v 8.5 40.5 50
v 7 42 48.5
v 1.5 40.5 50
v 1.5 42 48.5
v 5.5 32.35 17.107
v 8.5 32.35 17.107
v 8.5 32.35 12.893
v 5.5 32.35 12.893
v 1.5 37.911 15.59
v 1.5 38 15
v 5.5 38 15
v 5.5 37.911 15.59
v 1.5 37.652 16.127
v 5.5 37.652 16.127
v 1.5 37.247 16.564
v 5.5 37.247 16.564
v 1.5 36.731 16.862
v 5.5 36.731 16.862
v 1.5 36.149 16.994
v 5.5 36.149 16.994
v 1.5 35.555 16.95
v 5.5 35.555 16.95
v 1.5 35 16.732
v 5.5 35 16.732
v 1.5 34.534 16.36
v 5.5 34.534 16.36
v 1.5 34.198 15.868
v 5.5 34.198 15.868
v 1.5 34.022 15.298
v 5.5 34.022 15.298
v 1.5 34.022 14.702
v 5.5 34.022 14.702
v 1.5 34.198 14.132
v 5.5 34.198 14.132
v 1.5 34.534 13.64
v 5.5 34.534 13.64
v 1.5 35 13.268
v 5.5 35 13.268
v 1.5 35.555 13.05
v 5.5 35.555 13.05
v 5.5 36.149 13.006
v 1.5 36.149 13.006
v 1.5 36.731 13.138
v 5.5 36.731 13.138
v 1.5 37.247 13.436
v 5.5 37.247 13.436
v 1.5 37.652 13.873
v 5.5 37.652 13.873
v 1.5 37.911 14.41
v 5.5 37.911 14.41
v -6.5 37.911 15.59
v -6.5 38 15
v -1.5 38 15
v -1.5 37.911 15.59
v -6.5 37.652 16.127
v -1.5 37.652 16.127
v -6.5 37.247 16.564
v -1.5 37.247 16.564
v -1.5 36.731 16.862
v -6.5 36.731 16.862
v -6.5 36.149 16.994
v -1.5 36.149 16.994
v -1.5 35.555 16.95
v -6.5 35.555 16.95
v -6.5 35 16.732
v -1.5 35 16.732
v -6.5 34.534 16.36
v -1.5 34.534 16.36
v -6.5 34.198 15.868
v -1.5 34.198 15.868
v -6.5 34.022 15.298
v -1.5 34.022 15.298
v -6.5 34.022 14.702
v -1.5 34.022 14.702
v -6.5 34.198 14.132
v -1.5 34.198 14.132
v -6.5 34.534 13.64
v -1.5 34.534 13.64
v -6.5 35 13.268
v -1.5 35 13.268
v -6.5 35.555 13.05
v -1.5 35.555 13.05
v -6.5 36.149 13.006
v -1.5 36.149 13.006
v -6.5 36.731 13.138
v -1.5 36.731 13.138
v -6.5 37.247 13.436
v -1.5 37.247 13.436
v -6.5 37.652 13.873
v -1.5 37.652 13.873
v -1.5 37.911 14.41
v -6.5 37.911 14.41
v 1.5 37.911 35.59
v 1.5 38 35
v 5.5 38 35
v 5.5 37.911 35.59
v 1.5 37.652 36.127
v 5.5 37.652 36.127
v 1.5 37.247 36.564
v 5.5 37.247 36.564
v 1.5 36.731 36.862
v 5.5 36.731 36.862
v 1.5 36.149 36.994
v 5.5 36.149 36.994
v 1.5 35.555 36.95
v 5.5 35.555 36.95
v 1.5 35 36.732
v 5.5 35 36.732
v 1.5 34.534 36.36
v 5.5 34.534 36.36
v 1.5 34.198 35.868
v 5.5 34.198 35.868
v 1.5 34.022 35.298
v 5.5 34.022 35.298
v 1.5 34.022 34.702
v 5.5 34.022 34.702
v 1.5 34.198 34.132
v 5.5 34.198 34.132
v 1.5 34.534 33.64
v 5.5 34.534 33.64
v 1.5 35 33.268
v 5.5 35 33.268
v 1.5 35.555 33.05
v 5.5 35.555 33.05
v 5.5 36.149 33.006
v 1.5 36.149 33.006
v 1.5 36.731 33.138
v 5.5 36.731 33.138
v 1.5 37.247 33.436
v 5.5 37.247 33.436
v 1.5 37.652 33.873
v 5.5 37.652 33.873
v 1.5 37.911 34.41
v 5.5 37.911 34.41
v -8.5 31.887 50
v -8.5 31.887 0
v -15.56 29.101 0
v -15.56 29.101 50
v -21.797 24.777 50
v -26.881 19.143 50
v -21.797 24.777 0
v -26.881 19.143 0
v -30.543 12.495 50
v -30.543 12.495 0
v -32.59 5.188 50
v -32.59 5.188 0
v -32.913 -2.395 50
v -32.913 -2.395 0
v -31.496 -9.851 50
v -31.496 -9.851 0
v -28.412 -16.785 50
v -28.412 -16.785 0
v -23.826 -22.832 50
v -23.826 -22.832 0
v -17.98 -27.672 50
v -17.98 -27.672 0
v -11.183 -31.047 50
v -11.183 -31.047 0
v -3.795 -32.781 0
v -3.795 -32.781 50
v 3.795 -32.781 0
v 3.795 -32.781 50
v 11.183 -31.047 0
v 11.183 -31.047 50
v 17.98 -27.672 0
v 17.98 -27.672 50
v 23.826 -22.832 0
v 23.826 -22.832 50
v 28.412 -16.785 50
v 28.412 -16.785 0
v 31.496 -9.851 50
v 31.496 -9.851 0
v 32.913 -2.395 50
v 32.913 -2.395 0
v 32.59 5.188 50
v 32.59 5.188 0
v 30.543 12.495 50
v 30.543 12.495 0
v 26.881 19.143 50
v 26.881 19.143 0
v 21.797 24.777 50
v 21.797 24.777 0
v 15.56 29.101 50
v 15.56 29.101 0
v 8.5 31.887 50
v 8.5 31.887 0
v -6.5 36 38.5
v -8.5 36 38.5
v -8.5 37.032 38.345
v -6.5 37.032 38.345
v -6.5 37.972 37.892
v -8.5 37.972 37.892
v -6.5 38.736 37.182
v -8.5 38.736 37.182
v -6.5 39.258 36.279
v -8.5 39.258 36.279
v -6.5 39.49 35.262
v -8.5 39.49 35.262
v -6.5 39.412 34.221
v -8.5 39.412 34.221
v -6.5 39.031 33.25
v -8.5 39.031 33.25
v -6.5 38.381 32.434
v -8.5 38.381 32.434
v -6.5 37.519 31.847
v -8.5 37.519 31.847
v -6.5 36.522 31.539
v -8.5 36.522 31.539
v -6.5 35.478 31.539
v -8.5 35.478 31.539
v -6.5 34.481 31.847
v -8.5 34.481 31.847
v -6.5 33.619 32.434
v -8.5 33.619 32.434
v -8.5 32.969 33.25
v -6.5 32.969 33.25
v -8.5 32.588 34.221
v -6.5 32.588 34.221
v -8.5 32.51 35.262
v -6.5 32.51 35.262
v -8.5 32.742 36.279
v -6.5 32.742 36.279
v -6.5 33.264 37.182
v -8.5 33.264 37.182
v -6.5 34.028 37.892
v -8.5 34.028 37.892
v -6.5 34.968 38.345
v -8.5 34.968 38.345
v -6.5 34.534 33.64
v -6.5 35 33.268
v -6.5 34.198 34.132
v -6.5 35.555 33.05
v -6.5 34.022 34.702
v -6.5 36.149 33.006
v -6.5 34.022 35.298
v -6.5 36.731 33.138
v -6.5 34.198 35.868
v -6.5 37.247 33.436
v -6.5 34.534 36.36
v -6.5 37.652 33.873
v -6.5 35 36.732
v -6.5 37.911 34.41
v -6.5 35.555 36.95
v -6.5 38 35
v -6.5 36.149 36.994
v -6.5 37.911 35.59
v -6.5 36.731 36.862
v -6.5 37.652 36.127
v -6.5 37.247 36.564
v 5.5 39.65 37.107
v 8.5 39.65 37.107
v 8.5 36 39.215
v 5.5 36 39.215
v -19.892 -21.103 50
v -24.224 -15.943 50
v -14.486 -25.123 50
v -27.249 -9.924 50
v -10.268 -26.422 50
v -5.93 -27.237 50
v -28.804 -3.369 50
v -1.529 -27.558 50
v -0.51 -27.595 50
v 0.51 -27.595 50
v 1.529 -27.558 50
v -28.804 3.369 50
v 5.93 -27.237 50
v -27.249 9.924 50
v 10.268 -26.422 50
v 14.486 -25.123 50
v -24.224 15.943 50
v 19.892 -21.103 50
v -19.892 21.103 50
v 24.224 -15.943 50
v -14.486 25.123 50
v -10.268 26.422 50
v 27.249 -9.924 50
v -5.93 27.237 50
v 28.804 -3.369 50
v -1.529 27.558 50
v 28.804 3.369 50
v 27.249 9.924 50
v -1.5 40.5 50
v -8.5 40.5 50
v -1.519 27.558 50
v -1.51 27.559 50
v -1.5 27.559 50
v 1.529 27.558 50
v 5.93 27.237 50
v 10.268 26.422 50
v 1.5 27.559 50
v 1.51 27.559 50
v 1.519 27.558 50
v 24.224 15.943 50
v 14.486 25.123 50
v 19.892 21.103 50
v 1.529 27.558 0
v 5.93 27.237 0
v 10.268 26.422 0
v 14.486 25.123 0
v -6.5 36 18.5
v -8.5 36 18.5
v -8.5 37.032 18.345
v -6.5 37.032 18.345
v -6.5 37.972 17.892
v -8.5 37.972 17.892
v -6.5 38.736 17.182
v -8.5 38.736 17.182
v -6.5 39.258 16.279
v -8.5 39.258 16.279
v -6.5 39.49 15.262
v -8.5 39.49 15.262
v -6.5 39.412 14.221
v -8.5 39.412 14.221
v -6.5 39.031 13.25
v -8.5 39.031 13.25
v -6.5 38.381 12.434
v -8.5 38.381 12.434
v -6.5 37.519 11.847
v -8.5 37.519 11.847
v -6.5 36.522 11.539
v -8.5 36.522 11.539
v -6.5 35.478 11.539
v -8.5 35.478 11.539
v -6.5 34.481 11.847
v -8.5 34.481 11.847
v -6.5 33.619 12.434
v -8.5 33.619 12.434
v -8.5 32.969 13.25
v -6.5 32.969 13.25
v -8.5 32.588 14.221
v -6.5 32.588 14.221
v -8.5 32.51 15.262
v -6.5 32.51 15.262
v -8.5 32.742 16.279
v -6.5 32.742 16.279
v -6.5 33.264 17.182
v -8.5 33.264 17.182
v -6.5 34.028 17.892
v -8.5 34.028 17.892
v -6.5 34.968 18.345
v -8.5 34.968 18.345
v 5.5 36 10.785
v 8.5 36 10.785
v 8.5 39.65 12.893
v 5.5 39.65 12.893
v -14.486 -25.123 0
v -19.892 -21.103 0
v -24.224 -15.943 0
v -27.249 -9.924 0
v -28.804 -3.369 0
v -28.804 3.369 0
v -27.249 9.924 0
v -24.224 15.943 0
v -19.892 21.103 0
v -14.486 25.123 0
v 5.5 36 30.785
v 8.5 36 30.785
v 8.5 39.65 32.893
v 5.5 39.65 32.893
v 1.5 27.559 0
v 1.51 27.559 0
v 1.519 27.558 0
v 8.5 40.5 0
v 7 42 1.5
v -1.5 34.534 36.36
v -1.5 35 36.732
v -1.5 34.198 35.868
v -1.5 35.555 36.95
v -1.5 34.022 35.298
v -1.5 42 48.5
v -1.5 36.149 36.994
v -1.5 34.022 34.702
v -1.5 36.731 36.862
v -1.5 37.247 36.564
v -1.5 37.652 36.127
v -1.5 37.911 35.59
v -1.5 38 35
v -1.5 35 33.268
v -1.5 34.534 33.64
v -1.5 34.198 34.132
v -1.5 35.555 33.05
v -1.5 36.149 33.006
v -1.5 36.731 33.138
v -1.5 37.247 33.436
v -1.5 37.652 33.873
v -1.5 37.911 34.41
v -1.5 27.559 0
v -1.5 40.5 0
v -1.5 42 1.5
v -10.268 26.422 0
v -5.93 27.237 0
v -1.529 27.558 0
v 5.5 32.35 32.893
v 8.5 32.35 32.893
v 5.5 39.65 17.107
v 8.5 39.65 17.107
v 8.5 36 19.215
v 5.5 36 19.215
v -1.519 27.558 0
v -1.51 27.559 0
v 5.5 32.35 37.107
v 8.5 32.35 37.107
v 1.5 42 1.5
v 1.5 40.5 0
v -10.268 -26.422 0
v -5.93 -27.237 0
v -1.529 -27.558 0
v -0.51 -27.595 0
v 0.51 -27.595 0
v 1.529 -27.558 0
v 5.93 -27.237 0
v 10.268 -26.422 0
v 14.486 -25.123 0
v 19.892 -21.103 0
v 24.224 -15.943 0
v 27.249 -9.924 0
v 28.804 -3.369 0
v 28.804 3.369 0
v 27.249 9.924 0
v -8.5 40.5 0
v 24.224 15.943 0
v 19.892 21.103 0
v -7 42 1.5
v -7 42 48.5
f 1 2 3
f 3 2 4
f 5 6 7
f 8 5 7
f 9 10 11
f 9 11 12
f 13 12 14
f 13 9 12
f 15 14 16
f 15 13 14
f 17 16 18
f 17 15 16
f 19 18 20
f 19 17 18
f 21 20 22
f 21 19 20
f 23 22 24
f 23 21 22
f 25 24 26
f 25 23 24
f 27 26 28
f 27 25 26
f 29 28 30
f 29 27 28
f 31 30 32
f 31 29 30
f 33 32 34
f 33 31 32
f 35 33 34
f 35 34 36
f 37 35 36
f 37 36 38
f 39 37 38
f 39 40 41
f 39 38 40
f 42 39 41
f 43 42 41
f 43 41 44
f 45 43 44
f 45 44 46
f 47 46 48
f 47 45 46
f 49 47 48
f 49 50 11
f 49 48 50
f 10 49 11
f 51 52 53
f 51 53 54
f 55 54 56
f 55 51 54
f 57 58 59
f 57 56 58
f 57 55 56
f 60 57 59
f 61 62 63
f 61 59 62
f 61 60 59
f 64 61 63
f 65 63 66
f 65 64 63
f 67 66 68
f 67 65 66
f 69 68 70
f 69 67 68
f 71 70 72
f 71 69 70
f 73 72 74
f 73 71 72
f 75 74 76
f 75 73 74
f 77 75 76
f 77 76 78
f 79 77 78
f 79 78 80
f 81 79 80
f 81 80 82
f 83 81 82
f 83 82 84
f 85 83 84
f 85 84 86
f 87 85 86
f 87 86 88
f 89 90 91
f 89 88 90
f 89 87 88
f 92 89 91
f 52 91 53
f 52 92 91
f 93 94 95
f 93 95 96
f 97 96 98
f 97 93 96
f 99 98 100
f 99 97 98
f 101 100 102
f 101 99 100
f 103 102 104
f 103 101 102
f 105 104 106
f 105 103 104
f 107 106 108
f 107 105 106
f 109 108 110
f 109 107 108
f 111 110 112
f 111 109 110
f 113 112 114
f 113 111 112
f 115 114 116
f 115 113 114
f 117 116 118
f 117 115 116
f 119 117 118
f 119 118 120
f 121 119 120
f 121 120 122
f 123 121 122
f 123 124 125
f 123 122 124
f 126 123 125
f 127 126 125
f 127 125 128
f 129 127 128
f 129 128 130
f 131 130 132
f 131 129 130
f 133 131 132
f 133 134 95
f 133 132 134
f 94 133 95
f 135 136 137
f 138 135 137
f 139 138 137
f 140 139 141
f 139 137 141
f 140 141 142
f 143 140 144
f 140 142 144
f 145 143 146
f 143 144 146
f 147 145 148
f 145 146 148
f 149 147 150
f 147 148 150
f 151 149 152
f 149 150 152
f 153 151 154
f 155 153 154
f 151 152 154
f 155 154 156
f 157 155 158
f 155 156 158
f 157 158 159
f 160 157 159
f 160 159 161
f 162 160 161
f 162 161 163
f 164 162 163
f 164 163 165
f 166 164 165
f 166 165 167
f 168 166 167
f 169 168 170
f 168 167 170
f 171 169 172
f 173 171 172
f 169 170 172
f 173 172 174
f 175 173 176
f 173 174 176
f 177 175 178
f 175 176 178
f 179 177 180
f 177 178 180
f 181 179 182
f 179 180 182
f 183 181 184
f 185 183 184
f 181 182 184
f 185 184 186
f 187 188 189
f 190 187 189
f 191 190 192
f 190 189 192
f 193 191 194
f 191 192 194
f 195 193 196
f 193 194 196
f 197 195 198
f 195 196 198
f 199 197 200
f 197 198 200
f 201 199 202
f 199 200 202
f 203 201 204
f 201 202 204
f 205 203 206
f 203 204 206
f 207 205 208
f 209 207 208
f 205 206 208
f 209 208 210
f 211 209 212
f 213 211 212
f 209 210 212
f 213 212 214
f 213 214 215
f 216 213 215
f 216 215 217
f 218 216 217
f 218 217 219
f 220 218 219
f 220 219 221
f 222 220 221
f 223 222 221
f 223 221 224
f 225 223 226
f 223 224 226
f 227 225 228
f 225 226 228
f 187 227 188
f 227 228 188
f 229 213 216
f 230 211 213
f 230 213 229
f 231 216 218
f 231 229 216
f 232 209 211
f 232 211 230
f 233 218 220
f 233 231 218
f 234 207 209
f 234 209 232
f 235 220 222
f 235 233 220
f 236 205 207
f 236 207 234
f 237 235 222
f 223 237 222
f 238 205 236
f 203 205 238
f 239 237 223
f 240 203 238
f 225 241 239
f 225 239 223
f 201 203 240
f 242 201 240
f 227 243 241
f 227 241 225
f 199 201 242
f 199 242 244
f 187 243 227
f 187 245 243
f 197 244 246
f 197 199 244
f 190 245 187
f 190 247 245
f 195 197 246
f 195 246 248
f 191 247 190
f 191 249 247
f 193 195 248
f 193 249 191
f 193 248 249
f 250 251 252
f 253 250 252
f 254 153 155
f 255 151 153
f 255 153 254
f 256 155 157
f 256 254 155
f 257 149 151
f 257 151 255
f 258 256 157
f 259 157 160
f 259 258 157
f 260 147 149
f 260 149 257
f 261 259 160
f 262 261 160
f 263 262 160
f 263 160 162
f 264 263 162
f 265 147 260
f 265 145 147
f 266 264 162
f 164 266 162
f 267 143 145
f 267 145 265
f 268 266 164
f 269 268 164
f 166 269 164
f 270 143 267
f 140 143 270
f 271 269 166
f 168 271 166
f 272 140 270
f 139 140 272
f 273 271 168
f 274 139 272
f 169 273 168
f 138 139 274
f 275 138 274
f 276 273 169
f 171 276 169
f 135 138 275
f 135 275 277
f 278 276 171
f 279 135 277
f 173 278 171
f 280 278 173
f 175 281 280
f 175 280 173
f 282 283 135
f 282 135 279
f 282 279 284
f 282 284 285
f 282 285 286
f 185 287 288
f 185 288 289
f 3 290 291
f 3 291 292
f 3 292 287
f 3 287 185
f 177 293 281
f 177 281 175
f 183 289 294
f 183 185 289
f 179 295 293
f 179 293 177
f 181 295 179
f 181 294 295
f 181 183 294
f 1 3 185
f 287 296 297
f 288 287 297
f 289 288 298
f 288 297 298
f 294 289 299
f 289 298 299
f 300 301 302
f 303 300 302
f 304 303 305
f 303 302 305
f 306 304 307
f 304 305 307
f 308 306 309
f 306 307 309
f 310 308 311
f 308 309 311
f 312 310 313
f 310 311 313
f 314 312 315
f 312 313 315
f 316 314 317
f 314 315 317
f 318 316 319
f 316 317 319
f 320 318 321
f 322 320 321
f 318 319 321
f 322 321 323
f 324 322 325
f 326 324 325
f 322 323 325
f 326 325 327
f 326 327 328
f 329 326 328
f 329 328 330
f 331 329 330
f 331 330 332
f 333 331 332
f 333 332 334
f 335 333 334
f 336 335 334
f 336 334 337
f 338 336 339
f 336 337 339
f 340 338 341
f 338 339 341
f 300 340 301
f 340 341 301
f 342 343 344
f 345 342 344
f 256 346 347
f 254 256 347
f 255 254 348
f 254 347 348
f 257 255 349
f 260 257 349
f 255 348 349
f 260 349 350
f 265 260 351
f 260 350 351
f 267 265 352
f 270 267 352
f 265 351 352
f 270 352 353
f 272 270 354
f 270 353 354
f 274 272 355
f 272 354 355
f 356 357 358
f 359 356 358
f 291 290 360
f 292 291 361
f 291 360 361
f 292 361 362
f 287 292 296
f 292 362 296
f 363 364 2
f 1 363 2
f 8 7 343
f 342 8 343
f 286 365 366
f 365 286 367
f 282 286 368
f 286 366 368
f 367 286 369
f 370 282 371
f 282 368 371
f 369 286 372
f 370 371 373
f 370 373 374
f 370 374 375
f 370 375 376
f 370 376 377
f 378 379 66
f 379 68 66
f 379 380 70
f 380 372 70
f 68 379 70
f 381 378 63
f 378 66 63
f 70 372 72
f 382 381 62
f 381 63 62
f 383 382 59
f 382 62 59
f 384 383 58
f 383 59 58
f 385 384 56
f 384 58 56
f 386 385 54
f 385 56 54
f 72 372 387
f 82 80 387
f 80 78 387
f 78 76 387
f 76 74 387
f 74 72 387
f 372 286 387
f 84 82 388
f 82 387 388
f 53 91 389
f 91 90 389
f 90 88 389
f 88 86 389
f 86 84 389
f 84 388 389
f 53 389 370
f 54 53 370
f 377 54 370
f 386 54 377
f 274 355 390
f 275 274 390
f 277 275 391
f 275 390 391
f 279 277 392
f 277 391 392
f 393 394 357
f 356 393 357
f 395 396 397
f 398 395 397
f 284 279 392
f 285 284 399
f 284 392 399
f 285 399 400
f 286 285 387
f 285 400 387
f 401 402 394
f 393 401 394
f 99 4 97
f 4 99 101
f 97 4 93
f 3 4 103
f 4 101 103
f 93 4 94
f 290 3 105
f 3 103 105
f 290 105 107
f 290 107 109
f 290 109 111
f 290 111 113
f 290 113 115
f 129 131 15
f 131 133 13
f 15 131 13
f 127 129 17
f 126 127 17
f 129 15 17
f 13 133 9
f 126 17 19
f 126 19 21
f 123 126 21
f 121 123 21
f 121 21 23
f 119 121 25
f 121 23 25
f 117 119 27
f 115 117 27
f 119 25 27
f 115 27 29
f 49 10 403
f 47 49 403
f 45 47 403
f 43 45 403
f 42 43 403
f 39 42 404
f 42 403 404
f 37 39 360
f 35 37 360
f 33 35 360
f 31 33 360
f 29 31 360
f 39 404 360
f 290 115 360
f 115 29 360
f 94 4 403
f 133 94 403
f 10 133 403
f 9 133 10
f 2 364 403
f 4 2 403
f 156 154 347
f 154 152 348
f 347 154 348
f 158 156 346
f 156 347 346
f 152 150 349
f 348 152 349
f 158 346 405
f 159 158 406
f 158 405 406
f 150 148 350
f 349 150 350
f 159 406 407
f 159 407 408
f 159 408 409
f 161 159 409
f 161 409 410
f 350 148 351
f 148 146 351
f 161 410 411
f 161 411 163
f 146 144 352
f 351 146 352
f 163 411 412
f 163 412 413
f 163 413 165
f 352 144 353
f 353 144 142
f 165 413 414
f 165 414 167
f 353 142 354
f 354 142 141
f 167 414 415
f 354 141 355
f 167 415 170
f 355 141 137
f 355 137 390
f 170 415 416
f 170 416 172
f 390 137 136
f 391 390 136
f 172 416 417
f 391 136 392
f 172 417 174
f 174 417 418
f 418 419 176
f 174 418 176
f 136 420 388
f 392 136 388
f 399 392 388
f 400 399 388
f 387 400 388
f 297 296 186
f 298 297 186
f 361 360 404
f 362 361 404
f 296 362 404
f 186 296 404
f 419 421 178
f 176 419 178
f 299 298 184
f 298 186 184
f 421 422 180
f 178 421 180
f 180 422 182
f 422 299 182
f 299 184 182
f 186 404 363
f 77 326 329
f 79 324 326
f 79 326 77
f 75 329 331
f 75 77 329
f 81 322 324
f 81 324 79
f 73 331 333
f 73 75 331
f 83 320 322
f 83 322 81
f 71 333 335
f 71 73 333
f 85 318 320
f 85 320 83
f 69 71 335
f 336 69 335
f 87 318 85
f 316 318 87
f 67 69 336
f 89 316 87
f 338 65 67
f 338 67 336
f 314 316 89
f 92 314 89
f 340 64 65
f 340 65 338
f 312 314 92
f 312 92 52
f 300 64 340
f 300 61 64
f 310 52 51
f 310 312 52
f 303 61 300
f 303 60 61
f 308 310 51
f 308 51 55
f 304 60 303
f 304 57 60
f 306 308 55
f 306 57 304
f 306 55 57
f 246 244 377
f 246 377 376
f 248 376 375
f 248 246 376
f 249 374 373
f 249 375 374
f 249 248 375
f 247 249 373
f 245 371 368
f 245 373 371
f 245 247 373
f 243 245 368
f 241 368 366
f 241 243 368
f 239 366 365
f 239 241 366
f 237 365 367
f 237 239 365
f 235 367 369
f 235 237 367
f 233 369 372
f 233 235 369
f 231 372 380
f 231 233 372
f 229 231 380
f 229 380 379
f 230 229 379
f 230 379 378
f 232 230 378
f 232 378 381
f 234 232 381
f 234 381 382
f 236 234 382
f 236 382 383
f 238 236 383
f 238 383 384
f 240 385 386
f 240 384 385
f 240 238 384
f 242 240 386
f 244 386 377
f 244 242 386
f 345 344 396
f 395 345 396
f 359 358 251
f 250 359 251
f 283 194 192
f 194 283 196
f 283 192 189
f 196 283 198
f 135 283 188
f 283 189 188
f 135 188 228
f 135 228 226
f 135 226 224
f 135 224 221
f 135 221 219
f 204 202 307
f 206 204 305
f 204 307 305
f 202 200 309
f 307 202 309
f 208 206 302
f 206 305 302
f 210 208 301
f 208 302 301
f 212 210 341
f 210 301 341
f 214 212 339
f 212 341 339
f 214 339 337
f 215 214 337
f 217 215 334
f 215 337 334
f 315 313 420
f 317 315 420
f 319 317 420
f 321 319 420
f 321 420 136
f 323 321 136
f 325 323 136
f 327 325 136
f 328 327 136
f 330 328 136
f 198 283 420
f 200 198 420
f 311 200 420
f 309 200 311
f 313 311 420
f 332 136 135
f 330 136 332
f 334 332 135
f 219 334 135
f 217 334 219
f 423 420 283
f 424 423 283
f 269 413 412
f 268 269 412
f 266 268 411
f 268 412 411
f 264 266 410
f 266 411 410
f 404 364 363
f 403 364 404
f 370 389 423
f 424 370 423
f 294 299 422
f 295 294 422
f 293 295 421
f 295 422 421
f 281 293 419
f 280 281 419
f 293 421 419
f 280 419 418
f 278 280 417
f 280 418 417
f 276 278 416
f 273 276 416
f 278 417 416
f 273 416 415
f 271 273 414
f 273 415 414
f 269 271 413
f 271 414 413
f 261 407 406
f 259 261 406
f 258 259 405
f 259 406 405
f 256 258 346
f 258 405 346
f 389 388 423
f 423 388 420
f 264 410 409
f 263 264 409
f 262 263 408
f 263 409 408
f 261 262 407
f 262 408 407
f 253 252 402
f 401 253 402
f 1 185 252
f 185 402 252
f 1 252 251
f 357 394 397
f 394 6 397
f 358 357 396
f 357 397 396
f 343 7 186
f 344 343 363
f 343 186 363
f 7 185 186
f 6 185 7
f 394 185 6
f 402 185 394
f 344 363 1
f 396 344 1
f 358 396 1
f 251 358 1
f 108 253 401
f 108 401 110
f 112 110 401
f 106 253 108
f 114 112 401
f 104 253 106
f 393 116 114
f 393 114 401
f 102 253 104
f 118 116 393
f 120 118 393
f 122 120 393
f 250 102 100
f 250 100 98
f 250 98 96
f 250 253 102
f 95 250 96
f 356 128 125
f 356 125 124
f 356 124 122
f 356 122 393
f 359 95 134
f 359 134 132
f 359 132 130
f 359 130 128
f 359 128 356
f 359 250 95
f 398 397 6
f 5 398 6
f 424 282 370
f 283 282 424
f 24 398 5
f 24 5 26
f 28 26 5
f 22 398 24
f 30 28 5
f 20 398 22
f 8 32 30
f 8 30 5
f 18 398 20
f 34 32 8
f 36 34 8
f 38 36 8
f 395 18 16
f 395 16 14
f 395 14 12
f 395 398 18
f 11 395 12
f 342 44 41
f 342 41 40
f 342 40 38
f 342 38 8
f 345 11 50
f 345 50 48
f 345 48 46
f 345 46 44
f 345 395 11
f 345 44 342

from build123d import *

# Parameters (mm, degrees)
EXTRUDE_1_DEPTH          = 50
CUT_EXTRUDE_1_DEPTH      = 74.164198895
CUT_EXTRUDE_1_DEPTH_BACK = 74.164198895
SKETCH_2_R               = 2
SKETCH_3_R               = 3.5
CUT_EXTRUDE_2_DEPTH      = 2
CHAMFER_1_SIZE           = 1.5
CUT_EXTRUDE_3_DEPTH      = 3


with BuildPart() as part:
    # 스케치1 → 보스-돌출1 (new body)
    with BuildSketch(Plane.XY):
        with BuildLine():
            Line((-1.5, 32.465366161), (-1.5, 42))
            Line((-1.5, 42), (-8.5, 42))
            Line((-8.5, 42), (-8.5, 31.886517527))
            ThreePointArc((-8.5, 31.886517527), (0, -33), (8.5, 31.886517527))
            Line((8.5, 31.886517527), (8.5, 42))
            Line((8.5, 42), (1.5, 42))
            Line((1.5, 42), (1.5, 32.465366161))
            Line((1.5, 32.465366161), (1.5, 27.559208987))
            ThreePointArc((1.5, 27.559208987), (1.514407087, 27.558421057), (1.528813761, 27.557625596))
            ThreePointArc((1.528813761, 27.557625596), (8.110662779, 26.890433295), (14.48576204, 25.122951621))
            ThreePointArc((14.48576204, 25.122951621), (29, 0), (14.48576204, -25.122951621))
            ThreePointArc((14.48576204, -25.122951621), (8.110662779, -26.890433295), (1.528813761, -27.557625596))
            ThreePointArc((1.528813761, -27.557625596), (0, -27.6), (-1.528813761, -27.557625596))
            ThreePointArc((-1.528813761, -27.557625596), (-8.110662779, -26.890433295), (-14.48576204, -25.122951621))
            ThreePointArc((-14.48576204, -25.122951621), (-29, 0), (-14.48576204, 25.122951621))
            ThreePointArc((-14.48576204, 25.122951621), (-8.110662779, 26.890433295), (-1.528813761, 27.557625596))
            ThreePointArc((-1.528813761, 27.557625596), (-1.514407087, 27.558421057), (-1.5, 27.559208987))
            Line((-1.5, 27.559208987), (-1.5, 32.465366161))
        make_face()
    extrude(amount=EXTRUDE_1_DEPTH)

    # 스케치2 → 컷-돌출1 (cut, two sides: drawn at the far end of the back side and taken through both)
    with BuildSketch(Plane(origin=(0, 0, 0), x_dir=(0, 0, -1), z_dir=(1, 0, 0)).offset(-CUT_EXTRUDE_1_DEPTH_BACK)):
        with Locations(Location((-35, 36, 0), (0, 0, 90))):
            Circle(SKETCH_2_R)
        with Locations(Location((-15, 36, 0), (0, 0, 90))):
            Circle(SKETCH_2_R)
    extrude(amount=CUT_EXTRUDE_1_DEPTH + CUT_EXTRUDE_1_DEPTH_BACK, mode=Mode.SUBTRACT)

    # 스케치3 → 컷-돌출2 (cut)
    with BuildSketch(Plane.ZY.offset(8.5)):
        with Locations((15, 36)):
            Circle(SKETCH_3_R)
        with Locations((35, 36)):
            Circle(SKETCH_3_R)
    extrude(amount=-CUT_EXTRUDE_2_DEPTH, mode=Mode.SUBTRACT)

    # 모따기1
    chamfer_1_edges = [part.edges().sort_by_distance(p)[0] for p in [
        (-5, 42, 50),
        (5, 42, 0),
        (-5, 42, 0),
        (5, 42, 50),
        (8.5, 42, 25),
        (-8.5, 42, 25),
    ]]
    chamfer(chamfer_1_edges, length=CHAMFER_1_SIZE)

    # 스케치4 → 컷-돌출3 (cut)
    with BuildSketch(Plane(origin=(8.5, 0, 0), x_dir=(0, 0, -1), z_dir=(1, 0, 0))):
        Polygon((-30.785343035, 36), (-32.892671517, 39.65), (-37.107328483, 39.65), (-39.214656965, 36), (-37.107328483, 32.35), (-32.892671517, 32.35), align=None)
        Polygon((-10.785343035, 36), (-12.892671517, 39.65), (-17.107328483, 39.65), (-19.214656965, 36), (-17.107328483, 32.35), (-12.892671517, 32.35), align=None)
    extrude(amount=-CUT_EXTRUDE_3_DEPTH, mode=Mode.SUBTRACT)


solid = part.part
